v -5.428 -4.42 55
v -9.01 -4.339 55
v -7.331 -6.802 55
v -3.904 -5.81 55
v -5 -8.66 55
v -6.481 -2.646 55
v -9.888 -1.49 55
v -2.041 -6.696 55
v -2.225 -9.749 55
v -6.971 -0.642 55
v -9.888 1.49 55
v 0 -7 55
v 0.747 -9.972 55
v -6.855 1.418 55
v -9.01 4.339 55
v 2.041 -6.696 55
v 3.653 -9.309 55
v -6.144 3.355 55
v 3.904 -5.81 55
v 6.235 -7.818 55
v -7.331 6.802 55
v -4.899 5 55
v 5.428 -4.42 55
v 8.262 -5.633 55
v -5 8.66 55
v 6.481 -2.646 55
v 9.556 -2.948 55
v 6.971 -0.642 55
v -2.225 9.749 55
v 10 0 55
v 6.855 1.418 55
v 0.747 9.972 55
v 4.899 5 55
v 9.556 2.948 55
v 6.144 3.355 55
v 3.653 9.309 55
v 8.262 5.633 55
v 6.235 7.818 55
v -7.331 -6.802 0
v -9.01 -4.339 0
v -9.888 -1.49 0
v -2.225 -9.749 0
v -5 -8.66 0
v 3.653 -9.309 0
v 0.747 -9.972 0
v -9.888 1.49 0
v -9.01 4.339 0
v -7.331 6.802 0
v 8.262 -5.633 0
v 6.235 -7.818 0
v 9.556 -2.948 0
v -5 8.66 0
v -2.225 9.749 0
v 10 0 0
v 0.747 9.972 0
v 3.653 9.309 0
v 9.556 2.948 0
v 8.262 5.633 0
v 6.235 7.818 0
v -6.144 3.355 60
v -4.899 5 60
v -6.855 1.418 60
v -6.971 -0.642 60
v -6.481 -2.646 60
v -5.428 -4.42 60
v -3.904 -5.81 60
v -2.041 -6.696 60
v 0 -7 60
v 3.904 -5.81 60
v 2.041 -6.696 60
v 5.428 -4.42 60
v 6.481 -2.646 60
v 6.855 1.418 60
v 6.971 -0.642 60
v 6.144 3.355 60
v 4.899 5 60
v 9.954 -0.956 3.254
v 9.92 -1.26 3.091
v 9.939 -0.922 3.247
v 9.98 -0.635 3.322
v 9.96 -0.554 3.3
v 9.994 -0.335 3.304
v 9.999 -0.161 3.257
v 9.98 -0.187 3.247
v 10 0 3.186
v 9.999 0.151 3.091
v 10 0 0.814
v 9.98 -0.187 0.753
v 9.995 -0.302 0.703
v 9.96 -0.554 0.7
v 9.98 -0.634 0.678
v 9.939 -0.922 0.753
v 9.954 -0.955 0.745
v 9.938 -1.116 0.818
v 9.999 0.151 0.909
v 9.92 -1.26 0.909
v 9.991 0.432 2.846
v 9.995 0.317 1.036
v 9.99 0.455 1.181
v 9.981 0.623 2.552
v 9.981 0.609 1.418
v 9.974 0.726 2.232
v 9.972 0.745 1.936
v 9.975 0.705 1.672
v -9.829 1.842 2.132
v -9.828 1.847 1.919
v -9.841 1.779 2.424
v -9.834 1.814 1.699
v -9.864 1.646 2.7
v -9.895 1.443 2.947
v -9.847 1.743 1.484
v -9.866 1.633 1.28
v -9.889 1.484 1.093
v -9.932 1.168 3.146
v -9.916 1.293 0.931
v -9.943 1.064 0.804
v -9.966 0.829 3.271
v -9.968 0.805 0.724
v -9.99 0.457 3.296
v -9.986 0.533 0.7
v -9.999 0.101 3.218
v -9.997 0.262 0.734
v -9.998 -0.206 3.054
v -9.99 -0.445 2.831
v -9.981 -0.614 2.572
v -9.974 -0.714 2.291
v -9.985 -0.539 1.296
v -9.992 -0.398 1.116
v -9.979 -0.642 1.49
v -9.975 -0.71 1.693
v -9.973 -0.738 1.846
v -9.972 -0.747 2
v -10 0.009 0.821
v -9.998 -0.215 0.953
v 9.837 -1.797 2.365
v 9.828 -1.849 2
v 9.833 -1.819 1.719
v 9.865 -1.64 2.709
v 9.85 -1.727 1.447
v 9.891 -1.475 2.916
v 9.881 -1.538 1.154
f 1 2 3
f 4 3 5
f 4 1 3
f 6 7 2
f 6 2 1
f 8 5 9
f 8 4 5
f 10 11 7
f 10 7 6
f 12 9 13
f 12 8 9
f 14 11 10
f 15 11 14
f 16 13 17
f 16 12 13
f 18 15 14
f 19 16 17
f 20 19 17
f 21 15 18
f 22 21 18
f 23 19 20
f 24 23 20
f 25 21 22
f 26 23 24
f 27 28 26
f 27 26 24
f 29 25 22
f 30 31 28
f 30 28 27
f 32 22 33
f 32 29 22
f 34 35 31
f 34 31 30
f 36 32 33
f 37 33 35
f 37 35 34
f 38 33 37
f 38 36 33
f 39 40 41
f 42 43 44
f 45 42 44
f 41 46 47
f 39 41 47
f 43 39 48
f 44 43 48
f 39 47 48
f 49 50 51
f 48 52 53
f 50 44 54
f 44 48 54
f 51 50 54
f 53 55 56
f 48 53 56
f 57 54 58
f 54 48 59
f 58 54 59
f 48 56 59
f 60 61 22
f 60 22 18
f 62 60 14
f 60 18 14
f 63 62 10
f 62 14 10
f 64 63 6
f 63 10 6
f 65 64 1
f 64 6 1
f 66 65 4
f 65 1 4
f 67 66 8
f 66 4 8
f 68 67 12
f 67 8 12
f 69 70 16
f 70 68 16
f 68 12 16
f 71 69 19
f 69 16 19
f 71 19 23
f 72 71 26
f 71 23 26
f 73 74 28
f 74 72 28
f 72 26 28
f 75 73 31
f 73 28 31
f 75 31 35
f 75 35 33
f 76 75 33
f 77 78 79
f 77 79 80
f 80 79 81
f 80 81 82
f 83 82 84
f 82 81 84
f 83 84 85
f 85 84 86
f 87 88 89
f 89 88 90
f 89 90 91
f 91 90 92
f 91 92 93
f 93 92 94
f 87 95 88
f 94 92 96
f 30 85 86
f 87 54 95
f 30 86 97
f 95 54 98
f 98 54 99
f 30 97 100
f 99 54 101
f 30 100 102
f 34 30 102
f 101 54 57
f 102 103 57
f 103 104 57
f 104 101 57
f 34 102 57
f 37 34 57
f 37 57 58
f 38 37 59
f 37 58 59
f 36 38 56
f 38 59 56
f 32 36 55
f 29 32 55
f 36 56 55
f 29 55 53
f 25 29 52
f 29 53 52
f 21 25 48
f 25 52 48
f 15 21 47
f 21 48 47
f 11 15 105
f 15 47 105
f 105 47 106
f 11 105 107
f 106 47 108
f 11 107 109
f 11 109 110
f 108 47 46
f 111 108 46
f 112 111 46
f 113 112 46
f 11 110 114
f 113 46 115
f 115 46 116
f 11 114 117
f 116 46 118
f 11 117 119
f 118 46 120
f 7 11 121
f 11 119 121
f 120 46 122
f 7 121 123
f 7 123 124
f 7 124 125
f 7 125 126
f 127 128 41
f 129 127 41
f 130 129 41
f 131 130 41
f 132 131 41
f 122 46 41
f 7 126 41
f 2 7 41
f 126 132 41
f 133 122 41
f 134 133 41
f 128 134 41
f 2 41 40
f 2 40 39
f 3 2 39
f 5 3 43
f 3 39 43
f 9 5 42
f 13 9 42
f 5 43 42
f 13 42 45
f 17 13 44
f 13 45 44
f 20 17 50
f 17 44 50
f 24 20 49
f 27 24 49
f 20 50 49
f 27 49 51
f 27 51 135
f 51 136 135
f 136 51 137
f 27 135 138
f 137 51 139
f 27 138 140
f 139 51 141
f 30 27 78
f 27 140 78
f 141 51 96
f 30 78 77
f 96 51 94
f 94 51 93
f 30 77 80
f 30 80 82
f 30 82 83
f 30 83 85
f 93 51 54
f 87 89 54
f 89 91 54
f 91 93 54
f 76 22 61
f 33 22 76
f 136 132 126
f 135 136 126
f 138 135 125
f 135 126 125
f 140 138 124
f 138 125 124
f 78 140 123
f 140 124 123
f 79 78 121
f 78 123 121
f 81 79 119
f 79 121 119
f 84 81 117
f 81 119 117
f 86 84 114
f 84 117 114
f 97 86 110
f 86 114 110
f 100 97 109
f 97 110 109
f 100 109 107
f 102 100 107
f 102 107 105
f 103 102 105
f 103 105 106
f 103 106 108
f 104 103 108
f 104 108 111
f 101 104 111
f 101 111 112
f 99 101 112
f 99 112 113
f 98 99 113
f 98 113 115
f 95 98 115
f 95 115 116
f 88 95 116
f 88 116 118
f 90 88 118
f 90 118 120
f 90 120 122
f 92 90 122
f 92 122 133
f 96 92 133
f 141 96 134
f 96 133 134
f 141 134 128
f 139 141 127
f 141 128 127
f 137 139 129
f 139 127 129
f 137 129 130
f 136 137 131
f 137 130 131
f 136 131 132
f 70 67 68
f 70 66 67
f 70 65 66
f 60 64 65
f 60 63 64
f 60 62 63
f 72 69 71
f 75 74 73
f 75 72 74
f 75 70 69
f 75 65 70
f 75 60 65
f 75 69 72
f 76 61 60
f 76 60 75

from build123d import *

# Parameters (mm, degrees)
ESBO_O1_R                         = 10
RESSALTO_EXTRUS_O1_DEPTH          = 60
CORTE_EXTRUS_O1_START             = -5
ESBO_O7_R                         = 10
ESBO_O7_R_2                       = 7
CORTE_EXTRUS_O1_DEPTH             = 5
CORTE_EXTRUS_O2_START             = -5
CORTE_EXTRUS_O2_DEPTH             = 5
FURO_COM_FOLGA_DE_M21_D           = 2.6
FURO_COM_FOLGA_DE_M21_CSINK_D     = 2.65
FURO_COM_FOLGA_DE_M21_CSINK_ANGLE = 90


with BuildPart() as part:
    # Esboço1 → Ressalto-extrusão1 (new body)
    with BuildSketch(Plane.XY):
        Circle(ESBO_O1_R)
    extrude(amount=RESSALTO_EXTRUS_O1_DEPTH)

    # Esboço7 → Corte-extrusão1 (cut)
    with BuildSketch(Plane.XY.offset(60).offset(CORTE_EXTRUS_O1_START)):
        Circle(ESBO_O7_R)
        Circle(ESBO_O7_R_2, mode=Mode.SUBTRACT)
    extrude(amount=CORTE_EXTRUS_O1_DEPTH, mode=Mode.SUBTRACT)

    # Esboço9 → Corte-extrusão2 (cut)
    with BuildSketch(Plane.XY.offset(60).offset(CORTE_EXTRUS_O2_START)):
        with BuildLine():
            Line((-4.898979486, 5), (4.898979486, 5))
            ThreePointArc((4.898979486, 5), (0, 7), (-4.898979486, 5))
        make_face()
    extrude(amount=CORTE_EXTRUS_O2_DEPTH, mode=Mode.SUBTRACT)

    # Furo com folga de M21 (through all)
    with Locations(Plane(origin=(9.984543834, -0.555773718, 2), x_dir=(0.055577371817, 0.998454383406, 0), z_dir=(0.998454383406, -0.055577371817, 0))):
        with Locations((0, 0)):
            CounterSinkHole(FURO_COM_FOLGA_DE_M21_D / 2, FURO_COM_FOLGA_DE_M21_CSINK_D / 2, counter_sink_angle=FURO_COM_FOLGA_DE_M21_CSINK_ANGLE)


solid = part.part
